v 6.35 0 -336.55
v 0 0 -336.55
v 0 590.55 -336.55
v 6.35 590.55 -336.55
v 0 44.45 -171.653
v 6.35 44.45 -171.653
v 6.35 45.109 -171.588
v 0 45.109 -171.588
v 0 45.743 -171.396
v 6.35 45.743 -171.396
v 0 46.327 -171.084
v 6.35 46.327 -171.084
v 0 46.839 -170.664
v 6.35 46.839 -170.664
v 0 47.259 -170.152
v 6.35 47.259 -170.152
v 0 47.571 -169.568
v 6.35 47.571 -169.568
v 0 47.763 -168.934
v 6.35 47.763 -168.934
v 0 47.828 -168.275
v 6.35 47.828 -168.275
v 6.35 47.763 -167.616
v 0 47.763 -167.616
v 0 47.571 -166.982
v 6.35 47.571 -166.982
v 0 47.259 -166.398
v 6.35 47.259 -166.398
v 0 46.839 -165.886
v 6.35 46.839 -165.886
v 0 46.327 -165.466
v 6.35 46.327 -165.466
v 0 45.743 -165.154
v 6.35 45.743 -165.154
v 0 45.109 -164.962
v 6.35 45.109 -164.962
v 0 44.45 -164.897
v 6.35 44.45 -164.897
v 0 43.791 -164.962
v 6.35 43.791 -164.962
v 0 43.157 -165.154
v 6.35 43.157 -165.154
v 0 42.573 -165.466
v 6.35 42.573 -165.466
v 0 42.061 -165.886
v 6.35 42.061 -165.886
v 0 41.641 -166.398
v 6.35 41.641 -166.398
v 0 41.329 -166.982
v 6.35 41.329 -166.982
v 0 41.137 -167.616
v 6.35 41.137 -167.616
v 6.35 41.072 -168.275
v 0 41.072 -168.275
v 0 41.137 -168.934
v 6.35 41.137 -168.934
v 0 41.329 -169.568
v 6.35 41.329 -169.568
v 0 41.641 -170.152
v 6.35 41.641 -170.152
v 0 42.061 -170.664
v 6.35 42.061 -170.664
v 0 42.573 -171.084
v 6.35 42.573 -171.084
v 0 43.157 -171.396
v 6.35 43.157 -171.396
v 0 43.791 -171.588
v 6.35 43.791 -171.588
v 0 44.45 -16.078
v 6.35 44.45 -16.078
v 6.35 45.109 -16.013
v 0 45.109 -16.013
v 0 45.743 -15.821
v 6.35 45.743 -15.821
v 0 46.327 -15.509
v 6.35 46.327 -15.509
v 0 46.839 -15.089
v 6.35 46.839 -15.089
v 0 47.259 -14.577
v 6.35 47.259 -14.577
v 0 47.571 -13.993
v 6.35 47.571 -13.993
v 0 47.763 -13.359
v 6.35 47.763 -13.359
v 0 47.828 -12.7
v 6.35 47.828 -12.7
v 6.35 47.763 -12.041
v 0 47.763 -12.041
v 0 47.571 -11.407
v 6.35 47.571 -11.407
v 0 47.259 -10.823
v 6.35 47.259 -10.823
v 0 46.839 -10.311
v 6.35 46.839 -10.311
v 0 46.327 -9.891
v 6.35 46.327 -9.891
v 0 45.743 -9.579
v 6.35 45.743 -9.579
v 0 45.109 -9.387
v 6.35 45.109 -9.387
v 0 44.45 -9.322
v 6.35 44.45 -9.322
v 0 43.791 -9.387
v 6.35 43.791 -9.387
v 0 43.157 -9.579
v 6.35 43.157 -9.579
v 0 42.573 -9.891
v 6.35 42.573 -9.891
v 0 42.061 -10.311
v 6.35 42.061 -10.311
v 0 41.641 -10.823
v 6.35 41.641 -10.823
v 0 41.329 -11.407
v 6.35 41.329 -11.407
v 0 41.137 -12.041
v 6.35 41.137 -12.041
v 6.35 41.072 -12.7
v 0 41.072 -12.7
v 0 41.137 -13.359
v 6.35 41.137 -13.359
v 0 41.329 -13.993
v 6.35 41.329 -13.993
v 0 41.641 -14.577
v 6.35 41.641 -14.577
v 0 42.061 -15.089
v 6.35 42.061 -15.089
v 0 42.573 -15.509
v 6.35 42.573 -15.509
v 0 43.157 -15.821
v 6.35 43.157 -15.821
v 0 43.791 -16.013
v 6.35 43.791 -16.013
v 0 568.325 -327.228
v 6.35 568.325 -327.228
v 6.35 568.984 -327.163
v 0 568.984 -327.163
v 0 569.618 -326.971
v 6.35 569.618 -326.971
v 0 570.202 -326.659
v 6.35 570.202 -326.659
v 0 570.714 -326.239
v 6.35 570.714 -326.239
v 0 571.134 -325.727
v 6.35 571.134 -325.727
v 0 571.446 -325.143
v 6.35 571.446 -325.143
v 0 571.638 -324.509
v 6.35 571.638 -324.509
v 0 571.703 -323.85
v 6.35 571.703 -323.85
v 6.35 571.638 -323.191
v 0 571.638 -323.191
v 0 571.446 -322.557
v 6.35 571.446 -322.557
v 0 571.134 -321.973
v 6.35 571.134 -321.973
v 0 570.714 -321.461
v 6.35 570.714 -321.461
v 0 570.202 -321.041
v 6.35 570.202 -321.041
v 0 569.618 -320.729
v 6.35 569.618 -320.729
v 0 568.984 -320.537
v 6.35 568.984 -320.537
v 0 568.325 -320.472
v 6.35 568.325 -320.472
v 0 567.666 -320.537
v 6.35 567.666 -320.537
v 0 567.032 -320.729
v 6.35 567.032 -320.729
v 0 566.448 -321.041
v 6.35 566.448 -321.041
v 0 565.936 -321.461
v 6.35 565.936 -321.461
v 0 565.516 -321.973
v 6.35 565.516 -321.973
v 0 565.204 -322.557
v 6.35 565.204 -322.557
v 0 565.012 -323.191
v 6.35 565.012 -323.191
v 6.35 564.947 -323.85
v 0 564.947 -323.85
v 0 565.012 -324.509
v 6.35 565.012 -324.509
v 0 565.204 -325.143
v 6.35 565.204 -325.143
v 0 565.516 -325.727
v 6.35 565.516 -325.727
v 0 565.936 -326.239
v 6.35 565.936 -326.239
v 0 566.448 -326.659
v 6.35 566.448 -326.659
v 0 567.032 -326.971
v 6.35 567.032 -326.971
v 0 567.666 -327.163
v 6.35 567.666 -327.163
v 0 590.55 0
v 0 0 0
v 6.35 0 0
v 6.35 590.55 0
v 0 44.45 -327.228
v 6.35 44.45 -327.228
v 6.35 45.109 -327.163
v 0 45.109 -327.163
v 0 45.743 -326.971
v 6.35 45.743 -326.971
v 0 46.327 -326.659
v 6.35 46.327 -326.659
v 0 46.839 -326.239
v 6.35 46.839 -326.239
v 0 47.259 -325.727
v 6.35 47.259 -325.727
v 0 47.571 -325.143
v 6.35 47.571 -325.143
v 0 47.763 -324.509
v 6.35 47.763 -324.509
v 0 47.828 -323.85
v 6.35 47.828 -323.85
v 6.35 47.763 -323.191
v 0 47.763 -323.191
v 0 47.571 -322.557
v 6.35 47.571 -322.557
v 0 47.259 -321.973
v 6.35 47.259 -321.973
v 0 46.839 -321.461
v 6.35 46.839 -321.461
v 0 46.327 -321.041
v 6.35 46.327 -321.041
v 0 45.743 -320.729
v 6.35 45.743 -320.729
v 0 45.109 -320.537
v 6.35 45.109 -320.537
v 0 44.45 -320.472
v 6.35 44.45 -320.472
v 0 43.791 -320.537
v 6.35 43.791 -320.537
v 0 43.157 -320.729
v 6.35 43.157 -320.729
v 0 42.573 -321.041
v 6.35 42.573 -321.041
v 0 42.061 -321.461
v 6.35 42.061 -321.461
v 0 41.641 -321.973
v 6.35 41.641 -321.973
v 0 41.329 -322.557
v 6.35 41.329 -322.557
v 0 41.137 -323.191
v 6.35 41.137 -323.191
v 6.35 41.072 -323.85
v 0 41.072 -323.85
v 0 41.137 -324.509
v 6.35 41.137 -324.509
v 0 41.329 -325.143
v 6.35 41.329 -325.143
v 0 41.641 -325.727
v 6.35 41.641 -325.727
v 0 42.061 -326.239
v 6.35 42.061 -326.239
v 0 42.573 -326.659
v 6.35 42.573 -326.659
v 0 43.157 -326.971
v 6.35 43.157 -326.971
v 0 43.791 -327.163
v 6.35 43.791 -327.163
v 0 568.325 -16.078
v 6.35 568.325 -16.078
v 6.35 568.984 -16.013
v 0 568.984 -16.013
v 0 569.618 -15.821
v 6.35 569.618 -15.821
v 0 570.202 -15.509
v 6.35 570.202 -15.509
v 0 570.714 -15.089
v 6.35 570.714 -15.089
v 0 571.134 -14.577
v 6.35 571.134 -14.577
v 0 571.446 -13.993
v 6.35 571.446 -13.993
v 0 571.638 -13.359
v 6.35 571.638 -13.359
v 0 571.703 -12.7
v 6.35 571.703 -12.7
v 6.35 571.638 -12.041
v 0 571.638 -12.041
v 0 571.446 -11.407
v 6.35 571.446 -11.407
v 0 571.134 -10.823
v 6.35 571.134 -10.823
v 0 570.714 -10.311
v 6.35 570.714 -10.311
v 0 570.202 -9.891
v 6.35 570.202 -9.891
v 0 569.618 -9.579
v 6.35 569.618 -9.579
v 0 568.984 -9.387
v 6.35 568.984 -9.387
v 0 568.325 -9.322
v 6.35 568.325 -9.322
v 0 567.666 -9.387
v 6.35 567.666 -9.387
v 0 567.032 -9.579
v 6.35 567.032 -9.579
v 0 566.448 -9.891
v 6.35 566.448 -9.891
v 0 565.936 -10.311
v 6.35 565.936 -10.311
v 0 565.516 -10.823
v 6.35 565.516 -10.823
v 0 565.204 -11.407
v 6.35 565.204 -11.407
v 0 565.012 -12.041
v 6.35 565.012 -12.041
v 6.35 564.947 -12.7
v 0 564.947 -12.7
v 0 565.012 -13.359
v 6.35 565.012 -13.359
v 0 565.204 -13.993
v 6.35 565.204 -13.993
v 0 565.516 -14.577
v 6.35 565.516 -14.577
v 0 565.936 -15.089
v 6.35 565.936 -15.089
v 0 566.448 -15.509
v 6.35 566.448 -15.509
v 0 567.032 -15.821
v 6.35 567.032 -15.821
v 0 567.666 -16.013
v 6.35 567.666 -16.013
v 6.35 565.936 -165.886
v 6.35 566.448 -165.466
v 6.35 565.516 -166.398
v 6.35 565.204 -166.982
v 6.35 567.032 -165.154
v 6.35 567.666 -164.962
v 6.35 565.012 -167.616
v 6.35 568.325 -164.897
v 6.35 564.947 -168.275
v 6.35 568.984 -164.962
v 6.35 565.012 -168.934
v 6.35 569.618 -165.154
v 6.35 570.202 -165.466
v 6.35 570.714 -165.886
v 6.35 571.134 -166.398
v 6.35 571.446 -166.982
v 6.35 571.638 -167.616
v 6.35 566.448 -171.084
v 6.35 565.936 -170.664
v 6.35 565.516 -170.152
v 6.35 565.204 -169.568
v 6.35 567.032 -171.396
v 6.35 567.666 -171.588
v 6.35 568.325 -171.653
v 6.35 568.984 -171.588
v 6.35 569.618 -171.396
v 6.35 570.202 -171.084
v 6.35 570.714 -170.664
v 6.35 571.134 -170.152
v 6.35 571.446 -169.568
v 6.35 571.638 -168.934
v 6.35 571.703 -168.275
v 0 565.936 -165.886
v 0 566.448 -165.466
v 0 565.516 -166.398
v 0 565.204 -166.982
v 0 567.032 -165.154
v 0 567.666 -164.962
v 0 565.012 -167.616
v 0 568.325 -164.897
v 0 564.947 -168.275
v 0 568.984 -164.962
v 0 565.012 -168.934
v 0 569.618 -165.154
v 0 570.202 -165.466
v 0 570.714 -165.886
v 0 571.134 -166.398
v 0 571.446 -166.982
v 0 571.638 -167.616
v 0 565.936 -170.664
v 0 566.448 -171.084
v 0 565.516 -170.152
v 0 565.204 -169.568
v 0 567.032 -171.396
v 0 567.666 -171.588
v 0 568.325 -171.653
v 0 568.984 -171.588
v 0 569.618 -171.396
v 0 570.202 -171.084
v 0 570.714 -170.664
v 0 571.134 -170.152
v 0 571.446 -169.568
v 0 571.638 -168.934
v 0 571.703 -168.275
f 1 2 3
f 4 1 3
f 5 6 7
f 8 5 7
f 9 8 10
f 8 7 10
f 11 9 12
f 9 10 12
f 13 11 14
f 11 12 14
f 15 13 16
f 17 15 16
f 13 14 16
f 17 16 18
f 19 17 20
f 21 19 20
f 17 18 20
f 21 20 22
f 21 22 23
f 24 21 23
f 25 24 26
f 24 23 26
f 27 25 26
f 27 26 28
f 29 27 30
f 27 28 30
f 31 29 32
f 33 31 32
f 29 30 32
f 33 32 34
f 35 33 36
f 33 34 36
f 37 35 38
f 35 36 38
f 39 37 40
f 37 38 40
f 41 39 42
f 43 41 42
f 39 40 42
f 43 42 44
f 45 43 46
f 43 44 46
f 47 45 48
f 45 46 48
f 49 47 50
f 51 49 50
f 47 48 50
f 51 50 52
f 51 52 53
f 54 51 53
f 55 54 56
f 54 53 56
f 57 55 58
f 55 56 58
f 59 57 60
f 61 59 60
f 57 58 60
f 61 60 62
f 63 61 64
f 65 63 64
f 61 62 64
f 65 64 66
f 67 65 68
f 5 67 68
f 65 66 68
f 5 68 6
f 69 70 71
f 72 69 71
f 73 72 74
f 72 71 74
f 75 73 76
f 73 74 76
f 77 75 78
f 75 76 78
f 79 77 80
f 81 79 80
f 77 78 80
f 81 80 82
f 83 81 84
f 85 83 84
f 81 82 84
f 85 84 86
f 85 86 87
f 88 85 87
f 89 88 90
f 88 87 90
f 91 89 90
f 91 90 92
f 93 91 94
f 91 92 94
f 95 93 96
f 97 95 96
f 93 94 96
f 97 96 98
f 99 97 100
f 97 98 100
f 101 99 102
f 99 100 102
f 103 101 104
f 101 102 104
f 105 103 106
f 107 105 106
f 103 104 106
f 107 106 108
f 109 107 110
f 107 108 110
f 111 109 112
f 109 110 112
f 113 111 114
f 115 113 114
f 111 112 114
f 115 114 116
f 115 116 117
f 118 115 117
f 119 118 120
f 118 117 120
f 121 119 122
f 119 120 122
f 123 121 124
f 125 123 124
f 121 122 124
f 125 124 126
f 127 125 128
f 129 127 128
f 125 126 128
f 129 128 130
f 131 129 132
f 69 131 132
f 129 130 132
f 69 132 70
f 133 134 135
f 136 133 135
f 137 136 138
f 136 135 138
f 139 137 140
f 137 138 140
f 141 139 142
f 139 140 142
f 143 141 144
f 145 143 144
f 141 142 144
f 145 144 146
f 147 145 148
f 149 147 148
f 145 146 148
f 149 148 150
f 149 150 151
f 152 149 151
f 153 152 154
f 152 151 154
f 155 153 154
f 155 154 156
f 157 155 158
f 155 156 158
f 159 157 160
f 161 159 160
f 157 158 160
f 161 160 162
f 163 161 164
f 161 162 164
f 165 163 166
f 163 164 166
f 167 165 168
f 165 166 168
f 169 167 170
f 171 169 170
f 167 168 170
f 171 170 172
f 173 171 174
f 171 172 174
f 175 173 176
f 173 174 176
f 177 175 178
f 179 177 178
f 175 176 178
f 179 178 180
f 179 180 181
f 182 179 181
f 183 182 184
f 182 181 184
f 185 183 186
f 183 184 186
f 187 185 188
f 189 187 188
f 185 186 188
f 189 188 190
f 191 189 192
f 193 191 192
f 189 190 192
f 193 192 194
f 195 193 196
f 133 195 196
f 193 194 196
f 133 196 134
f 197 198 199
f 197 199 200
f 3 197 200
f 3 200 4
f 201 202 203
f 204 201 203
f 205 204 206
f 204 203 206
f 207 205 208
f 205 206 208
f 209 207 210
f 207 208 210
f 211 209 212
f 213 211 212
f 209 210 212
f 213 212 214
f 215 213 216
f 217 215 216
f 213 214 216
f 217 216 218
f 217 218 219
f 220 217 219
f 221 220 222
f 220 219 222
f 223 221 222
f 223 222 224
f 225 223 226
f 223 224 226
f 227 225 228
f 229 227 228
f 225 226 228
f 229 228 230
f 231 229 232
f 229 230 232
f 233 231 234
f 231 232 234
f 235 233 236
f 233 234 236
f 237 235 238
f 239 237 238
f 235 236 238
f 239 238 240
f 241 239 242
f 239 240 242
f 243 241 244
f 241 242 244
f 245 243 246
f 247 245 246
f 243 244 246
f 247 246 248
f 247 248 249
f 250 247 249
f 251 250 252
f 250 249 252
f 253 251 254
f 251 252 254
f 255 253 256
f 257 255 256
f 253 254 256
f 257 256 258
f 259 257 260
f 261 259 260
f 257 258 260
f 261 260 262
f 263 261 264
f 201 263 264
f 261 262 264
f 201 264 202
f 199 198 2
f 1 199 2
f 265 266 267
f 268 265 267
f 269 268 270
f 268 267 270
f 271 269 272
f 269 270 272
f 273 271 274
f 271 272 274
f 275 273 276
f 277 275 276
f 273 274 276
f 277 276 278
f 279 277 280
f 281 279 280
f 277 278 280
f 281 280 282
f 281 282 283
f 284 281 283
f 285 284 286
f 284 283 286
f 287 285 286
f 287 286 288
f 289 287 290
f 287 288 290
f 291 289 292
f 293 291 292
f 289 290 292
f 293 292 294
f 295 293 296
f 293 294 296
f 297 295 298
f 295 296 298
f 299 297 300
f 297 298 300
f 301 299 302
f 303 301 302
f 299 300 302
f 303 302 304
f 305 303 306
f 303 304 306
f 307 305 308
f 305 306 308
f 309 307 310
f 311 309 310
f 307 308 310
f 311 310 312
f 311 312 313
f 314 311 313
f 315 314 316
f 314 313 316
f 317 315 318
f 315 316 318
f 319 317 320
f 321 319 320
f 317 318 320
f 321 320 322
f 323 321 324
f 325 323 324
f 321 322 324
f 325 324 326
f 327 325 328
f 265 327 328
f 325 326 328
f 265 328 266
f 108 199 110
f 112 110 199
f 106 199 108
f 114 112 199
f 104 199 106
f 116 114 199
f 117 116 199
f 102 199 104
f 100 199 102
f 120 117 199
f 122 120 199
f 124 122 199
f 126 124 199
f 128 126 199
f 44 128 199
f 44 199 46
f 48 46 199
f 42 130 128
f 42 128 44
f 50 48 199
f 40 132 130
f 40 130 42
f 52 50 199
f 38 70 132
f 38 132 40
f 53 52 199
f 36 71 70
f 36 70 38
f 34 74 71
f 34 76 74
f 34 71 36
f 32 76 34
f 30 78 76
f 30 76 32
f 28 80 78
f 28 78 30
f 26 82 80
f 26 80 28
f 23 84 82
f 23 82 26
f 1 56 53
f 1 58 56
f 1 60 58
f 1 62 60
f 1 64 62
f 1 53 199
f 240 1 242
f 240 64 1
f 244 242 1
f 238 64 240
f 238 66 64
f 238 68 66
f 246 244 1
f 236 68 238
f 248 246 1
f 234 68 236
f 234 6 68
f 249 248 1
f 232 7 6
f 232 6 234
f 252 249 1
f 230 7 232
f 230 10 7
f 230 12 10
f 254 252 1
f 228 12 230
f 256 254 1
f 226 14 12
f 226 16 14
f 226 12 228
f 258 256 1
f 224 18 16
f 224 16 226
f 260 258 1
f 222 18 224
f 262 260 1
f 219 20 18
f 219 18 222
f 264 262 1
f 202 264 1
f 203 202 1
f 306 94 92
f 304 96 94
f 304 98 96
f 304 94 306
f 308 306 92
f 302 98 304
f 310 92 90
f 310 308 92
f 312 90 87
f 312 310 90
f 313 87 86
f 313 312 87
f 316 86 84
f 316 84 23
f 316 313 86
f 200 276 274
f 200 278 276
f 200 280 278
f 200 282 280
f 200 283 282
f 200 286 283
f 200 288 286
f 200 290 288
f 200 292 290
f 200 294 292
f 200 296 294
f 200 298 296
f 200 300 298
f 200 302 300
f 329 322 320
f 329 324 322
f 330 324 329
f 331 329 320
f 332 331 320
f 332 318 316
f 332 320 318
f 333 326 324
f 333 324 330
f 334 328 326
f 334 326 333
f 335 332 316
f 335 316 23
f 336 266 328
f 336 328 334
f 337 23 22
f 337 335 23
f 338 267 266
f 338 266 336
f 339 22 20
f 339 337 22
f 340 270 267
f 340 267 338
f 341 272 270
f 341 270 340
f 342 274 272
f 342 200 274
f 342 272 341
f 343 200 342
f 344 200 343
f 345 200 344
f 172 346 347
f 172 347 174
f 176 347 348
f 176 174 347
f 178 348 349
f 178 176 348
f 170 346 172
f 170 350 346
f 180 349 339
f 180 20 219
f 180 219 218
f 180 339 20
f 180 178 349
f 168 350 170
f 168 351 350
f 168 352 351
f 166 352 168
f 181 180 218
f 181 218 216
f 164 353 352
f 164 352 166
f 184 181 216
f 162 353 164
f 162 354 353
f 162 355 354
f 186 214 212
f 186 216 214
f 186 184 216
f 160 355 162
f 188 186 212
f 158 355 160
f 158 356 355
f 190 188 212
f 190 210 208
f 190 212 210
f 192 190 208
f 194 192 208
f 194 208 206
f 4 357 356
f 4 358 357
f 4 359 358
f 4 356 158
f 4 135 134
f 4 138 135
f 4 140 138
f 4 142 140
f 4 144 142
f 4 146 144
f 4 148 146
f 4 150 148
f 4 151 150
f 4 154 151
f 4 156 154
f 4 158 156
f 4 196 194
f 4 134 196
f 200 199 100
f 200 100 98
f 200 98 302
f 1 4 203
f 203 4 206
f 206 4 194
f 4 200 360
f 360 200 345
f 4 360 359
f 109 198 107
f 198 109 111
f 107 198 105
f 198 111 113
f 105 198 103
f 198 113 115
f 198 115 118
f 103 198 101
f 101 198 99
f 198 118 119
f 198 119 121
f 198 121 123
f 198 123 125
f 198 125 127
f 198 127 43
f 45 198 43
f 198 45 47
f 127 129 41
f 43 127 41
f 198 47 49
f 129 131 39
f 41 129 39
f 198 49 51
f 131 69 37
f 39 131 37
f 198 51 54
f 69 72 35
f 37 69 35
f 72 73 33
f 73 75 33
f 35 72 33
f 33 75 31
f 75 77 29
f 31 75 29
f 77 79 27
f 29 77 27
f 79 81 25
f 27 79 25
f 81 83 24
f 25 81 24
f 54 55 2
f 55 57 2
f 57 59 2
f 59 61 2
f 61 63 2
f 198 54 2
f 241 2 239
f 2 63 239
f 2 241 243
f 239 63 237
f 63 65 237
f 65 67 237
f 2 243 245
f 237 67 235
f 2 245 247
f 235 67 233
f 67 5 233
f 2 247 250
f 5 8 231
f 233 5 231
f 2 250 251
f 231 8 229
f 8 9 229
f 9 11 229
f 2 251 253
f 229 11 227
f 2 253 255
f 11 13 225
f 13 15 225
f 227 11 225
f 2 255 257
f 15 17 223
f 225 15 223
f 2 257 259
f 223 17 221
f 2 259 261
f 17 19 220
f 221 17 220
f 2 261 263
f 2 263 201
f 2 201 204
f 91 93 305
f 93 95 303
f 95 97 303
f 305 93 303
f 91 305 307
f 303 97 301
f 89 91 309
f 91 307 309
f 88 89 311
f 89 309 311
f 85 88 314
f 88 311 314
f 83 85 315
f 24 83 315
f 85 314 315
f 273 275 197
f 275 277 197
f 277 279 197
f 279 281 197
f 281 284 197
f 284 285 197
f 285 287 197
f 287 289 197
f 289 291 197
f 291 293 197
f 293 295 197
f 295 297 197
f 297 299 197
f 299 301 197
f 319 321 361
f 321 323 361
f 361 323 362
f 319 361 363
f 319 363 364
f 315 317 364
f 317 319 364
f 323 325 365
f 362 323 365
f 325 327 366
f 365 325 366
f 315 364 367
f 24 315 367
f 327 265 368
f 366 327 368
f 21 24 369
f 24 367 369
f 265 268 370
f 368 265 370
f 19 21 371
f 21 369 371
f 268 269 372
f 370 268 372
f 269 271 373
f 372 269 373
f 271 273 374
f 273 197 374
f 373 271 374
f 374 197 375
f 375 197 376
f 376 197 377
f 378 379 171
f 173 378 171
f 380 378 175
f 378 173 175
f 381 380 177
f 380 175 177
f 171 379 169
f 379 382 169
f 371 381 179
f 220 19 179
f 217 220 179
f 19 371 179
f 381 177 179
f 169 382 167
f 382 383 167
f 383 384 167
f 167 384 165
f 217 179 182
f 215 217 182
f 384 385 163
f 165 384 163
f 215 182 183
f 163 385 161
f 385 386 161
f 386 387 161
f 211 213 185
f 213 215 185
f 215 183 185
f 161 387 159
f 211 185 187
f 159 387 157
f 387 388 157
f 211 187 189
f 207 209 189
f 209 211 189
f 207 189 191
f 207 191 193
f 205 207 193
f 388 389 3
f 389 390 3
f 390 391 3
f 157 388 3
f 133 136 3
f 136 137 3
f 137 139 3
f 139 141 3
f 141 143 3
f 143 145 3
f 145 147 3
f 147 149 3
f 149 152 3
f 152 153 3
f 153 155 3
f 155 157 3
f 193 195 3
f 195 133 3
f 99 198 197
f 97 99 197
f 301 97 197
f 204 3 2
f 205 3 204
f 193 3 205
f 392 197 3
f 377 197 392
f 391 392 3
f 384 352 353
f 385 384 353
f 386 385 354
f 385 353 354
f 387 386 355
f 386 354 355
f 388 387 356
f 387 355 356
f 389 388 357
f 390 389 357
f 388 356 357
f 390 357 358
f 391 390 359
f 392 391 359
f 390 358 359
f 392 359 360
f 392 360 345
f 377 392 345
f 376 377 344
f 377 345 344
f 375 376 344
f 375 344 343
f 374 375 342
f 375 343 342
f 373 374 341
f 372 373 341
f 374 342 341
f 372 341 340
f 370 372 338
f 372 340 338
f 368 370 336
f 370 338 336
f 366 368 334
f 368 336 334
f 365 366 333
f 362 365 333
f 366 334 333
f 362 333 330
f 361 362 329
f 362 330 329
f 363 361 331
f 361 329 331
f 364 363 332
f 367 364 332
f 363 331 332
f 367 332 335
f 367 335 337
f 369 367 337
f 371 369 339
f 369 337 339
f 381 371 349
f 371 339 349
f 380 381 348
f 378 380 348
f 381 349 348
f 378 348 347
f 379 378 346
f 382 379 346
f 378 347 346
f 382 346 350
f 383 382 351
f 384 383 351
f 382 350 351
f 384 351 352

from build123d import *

# Parameters (mm, degrees)
SKETCH1_W           = 336.55
SKETCH1_H           = 590.55
BOSS_EXTRUDE1_DEPTH = 6.35
SKETCH2_R           = 3.3782
CUT_EXTRUDE1_DEPTH  = 6.35
LPATTERN1_COUNT     = 3
LPATTERN1_PITCH     = 155.575


with BuildPart() as part:
    # Sketch1 → Boss-Extrude1 (new body)
    with BuildSketch(Plane(origin=(0, 0, 0), x_dir=(0, 0, -1), z_dir=(1, 0, 0))):
        with Locations((168.275, 295.275)):
            Rectangle(SKETCH1_W, SKETCH1_H)
    extrude(amount=BOSS_EXTRUDE1_DEPTH)

    # Sketch2 → Cut-Extrude1 (cut)
    with BuildSketch(Plane(origin=(6.35, 0, 0), x_dir=(0, 0, -1), z_dir=(1, 0, 0))):
        with Locations((323.85, 568.325)):
            Circle(SKETCH2_R)
        with Locations((323.85, 44.45)):
            Circle(SKETCH2_R)
    cut_extrude1 = extrude(amount=-CUT_EXTRUDE1_DEPTH, mode=Mode.SUBTRACT)

    # LPattern1: Cut-Extrude1 ×3
    with Locations(*[(0, 0, i * LPATTERN1_PITCH) for i in range(1, LPATTERN1_COUNT)]):
        add(cut_extrude1, mode=Mode.SUBTRACT)


solid = part.part
